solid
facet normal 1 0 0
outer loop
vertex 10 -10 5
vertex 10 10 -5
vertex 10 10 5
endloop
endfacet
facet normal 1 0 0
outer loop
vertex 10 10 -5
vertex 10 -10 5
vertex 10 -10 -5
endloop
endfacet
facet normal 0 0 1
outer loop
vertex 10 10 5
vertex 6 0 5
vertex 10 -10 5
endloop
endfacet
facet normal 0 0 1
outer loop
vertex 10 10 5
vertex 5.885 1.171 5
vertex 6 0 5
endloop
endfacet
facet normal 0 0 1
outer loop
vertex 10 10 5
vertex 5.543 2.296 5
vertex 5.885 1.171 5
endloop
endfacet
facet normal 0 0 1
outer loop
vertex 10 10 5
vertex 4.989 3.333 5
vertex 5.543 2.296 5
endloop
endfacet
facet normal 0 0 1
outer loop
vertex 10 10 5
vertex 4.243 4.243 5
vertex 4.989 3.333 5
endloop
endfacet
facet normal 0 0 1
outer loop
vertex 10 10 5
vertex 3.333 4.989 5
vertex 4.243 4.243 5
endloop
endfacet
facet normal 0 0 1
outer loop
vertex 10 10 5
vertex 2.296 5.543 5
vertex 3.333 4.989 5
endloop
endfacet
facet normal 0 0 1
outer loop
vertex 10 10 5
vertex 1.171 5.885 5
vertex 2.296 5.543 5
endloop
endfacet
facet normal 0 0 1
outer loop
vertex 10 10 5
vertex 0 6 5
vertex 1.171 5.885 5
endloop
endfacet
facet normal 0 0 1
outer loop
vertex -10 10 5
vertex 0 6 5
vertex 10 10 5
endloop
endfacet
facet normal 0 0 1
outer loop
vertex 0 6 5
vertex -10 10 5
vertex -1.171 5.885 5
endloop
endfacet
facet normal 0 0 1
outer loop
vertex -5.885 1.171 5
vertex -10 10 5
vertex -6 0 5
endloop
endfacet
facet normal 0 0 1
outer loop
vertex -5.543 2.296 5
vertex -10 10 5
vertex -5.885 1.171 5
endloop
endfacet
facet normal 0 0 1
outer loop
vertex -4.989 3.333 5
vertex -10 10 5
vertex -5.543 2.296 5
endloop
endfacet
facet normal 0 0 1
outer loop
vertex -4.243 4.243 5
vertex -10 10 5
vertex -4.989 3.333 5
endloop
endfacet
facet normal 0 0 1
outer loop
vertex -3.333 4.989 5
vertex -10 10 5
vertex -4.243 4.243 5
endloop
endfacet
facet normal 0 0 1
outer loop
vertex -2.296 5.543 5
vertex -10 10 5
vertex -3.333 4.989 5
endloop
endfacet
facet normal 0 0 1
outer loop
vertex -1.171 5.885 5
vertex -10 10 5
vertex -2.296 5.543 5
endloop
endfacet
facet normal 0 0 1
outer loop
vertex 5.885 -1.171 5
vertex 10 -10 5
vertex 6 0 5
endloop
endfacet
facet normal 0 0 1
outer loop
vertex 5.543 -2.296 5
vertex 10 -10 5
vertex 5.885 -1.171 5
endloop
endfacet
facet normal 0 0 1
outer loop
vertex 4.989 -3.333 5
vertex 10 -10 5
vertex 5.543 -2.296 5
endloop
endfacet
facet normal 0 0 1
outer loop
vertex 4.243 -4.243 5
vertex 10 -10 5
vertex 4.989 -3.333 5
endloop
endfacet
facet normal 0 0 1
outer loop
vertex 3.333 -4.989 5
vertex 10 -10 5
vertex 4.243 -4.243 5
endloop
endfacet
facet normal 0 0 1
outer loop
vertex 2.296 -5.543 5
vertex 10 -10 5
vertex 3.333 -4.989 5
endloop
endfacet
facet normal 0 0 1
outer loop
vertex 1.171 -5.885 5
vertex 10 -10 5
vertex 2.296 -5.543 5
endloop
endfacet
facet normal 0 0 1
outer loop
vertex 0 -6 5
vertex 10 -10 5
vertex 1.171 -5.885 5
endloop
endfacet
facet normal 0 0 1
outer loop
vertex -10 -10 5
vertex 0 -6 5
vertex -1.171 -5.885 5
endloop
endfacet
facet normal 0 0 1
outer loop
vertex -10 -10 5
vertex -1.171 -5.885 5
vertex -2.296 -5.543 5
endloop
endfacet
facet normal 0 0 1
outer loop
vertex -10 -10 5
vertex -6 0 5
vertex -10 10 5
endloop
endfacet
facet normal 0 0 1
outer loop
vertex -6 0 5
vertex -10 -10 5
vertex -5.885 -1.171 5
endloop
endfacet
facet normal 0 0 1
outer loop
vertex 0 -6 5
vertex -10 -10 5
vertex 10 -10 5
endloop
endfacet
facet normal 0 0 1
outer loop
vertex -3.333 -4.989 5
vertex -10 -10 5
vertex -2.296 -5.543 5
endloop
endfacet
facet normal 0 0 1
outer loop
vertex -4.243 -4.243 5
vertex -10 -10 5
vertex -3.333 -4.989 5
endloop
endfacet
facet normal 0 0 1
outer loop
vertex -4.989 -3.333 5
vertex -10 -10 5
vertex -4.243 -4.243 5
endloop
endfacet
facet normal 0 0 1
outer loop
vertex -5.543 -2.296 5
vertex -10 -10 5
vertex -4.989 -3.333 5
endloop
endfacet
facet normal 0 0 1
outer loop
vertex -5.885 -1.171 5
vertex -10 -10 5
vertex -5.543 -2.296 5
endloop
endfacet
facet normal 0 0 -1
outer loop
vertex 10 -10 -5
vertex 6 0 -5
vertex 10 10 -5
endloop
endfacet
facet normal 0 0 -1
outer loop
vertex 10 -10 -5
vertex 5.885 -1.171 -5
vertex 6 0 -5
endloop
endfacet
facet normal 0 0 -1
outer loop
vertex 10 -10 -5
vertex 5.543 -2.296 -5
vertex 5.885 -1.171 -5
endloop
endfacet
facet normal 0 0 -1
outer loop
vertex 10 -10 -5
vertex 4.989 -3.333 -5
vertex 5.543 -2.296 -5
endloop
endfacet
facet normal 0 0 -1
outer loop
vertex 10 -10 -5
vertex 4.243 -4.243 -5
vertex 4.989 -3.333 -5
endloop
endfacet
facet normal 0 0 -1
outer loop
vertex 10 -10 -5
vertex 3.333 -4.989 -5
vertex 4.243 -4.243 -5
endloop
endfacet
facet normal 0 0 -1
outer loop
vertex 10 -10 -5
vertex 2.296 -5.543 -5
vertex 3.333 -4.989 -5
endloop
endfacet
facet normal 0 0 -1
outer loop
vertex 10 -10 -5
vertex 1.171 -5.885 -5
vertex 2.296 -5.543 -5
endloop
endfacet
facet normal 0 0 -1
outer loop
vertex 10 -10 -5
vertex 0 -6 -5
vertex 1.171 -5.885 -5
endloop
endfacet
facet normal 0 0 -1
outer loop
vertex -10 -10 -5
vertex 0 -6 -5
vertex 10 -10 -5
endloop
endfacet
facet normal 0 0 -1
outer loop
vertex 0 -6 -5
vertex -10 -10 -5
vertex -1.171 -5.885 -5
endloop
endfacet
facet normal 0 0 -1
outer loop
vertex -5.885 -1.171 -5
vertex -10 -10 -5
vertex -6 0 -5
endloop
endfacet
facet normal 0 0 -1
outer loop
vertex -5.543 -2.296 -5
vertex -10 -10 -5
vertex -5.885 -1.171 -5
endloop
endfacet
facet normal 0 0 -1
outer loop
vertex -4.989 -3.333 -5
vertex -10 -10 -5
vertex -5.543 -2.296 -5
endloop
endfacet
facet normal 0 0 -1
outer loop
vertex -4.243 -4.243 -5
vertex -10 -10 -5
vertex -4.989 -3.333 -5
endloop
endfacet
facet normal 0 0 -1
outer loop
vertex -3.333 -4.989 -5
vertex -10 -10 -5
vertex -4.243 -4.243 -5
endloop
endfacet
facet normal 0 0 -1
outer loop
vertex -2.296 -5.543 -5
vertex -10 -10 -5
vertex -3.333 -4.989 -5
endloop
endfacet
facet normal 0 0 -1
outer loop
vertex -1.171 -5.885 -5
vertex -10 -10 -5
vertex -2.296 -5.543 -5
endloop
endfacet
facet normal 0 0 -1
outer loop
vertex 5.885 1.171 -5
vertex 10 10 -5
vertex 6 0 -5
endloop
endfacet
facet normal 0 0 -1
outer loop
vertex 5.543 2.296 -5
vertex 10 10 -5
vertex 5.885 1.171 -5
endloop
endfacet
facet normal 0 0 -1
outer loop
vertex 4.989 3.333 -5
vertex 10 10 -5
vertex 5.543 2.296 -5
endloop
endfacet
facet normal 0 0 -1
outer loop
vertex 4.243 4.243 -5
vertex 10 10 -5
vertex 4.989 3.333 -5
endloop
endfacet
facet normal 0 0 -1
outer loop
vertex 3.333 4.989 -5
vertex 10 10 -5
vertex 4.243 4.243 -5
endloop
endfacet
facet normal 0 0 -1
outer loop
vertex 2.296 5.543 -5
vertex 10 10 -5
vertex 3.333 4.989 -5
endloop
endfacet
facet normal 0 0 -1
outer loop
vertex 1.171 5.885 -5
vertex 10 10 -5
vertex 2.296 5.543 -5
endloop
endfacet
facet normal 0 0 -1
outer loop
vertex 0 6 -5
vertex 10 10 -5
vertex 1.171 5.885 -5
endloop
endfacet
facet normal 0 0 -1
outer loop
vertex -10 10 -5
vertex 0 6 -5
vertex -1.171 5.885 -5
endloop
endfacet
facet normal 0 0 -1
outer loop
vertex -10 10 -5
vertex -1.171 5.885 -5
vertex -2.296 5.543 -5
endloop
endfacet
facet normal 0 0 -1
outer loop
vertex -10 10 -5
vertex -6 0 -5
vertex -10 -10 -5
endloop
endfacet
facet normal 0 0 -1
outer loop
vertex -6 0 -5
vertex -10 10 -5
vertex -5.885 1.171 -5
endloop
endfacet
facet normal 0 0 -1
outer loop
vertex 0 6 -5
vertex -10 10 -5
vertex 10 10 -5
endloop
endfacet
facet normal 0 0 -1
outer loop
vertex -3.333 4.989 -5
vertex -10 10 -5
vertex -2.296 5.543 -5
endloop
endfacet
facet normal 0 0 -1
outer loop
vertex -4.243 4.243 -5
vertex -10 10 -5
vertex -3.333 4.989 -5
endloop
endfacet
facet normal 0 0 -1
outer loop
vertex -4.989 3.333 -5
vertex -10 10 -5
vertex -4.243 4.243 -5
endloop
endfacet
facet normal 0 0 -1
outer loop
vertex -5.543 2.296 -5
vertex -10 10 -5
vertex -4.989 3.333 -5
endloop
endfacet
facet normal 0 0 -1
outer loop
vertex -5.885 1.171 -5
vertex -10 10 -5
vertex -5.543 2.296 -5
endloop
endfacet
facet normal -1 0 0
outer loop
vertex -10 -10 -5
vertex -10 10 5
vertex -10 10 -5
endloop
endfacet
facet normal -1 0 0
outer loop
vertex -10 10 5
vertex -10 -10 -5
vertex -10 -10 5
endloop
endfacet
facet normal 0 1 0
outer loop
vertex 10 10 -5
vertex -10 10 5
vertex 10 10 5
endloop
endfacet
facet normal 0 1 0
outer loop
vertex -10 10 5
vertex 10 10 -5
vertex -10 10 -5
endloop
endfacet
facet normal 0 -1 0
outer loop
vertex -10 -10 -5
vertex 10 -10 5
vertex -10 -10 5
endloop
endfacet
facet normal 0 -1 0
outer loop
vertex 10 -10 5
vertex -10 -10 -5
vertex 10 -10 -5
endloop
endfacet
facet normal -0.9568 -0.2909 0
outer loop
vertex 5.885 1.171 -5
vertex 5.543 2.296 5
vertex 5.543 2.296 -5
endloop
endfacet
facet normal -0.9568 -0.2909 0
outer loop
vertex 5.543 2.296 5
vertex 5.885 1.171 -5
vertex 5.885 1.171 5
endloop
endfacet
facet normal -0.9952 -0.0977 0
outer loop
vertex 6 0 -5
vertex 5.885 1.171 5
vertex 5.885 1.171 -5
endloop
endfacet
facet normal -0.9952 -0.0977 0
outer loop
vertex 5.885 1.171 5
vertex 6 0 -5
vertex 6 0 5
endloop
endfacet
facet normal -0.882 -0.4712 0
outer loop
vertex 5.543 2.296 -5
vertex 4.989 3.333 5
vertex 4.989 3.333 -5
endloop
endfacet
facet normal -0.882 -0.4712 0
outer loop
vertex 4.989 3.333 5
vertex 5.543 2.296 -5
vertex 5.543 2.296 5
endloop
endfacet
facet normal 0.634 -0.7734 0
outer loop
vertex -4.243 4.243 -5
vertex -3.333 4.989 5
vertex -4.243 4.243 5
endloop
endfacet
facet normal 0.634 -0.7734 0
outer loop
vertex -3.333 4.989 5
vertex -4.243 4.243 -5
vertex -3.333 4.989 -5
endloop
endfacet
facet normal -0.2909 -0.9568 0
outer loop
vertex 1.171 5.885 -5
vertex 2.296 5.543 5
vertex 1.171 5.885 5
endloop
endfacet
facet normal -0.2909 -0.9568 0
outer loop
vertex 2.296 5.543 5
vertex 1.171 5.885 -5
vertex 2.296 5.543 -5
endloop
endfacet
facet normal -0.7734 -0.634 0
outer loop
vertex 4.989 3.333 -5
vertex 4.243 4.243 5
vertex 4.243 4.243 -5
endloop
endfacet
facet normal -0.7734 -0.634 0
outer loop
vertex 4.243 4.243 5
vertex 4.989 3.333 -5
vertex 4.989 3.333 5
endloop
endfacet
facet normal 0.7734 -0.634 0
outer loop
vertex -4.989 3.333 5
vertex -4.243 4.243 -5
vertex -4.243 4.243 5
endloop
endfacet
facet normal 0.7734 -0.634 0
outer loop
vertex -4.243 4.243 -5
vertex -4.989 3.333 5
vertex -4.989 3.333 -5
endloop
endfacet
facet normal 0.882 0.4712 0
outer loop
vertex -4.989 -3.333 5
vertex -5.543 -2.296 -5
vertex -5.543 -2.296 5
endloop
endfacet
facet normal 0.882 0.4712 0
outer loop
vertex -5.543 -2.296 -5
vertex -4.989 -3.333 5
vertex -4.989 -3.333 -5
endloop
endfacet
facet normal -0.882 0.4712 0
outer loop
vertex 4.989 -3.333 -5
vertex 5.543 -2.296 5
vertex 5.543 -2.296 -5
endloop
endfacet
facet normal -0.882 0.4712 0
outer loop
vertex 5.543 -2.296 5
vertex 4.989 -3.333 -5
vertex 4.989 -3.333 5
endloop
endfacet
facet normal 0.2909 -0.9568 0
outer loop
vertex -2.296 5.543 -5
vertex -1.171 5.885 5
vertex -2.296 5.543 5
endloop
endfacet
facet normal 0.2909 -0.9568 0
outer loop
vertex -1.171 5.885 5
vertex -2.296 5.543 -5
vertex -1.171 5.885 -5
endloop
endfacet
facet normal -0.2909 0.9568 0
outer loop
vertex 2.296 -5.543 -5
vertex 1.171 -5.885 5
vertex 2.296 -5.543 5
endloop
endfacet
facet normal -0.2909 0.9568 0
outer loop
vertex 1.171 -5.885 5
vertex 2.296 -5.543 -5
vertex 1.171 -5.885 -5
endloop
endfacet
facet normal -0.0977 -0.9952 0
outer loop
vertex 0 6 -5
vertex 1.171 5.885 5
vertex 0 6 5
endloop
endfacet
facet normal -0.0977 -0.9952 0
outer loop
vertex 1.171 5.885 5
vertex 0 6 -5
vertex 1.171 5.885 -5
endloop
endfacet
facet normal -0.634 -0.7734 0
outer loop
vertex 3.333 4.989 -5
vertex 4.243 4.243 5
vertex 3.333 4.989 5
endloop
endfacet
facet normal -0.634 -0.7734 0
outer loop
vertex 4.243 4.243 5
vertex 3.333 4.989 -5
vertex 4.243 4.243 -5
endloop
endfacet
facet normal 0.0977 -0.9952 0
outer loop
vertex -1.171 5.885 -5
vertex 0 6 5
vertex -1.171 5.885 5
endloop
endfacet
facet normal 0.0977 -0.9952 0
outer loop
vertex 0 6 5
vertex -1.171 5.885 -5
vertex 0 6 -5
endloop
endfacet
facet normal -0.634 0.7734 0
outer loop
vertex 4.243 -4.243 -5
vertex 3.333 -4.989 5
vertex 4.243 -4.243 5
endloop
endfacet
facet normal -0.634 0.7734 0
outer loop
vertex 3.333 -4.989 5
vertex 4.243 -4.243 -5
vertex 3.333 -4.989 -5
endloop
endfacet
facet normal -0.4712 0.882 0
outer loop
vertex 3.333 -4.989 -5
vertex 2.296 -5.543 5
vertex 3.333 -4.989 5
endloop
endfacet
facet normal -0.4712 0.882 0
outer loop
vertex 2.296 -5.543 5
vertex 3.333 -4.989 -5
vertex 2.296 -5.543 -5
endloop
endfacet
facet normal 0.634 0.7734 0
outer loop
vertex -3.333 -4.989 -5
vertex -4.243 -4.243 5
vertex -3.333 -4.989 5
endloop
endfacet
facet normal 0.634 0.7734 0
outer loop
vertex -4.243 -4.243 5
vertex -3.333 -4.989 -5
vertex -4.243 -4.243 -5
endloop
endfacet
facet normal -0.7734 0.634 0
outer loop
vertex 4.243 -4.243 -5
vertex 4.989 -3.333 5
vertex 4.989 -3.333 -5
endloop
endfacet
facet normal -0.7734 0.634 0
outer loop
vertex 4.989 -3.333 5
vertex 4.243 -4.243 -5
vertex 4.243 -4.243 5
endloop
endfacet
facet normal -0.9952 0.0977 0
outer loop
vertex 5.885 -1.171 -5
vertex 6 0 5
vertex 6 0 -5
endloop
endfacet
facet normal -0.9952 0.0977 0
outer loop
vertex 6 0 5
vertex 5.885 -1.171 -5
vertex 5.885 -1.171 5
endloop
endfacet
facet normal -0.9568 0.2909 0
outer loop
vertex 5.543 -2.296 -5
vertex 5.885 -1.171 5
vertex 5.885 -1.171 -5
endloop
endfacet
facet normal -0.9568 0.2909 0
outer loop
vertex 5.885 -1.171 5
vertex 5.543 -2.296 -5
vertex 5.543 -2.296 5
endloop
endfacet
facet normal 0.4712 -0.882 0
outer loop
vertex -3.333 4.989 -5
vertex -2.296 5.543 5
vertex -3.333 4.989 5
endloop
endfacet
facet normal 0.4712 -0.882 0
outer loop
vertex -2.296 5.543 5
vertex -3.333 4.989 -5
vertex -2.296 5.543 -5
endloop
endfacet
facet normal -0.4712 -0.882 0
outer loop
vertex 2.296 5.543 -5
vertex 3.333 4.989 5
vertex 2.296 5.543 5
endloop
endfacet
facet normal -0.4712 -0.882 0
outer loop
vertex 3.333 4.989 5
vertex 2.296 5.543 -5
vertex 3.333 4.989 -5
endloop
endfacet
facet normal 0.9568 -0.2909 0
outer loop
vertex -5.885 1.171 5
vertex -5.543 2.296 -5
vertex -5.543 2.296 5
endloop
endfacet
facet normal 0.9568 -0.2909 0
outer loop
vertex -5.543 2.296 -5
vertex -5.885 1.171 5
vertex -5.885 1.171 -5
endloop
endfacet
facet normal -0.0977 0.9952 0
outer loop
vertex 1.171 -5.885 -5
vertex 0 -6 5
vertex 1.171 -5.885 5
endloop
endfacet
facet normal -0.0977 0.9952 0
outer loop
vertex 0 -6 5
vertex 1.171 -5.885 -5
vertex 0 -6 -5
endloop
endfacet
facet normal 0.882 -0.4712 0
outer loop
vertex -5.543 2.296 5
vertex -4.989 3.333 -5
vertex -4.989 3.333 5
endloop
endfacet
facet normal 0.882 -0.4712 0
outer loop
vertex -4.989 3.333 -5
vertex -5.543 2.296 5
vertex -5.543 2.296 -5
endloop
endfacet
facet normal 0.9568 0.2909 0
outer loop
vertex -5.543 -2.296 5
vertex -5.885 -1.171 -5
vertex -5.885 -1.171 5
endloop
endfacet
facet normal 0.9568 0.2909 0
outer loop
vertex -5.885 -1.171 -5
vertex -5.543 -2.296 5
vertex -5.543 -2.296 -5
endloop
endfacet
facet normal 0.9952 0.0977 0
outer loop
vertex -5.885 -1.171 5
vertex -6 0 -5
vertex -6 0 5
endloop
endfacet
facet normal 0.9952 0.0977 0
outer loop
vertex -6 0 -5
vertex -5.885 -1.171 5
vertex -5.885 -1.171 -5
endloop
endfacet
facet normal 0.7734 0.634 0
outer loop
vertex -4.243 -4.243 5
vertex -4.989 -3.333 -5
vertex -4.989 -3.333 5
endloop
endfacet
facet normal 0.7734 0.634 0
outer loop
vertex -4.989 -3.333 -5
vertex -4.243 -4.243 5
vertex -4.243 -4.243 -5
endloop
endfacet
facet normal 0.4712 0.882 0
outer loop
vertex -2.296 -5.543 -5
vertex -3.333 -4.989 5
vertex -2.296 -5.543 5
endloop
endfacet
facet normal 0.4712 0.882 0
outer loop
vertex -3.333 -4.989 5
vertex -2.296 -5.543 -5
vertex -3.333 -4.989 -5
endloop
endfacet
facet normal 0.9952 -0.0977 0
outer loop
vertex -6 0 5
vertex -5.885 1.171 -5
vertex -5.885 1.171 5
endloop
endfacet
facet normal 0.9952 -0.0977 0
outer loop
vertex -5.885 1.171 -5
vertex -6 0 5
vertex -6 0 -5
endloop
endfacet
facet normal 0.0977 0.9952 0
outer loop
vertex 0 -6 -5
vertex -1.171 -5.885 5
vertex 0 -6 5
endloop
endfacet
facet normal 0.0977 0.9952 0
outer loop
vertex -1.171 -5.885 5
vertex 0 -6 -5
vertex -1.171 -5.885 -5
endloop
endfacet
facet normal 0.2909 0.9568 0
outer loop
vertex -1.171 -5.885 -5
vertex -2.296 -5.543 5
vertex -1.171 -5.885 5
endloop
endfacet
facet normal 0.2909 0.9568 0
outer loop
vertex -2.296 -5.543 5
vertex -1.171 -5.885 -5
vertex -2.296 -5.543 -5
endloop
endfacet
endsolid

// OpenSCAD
// Trivial fixture to smoke-test the dockerized renderer end to end.
// render: tools/render/render.ps1 tools\render\smoketest.scad out\smoketest.stl
$fn = 32;
difference() {
    cube([20, 20, 10], center = true);
    cylinder(h = 12, r = 6, center = true);
}
